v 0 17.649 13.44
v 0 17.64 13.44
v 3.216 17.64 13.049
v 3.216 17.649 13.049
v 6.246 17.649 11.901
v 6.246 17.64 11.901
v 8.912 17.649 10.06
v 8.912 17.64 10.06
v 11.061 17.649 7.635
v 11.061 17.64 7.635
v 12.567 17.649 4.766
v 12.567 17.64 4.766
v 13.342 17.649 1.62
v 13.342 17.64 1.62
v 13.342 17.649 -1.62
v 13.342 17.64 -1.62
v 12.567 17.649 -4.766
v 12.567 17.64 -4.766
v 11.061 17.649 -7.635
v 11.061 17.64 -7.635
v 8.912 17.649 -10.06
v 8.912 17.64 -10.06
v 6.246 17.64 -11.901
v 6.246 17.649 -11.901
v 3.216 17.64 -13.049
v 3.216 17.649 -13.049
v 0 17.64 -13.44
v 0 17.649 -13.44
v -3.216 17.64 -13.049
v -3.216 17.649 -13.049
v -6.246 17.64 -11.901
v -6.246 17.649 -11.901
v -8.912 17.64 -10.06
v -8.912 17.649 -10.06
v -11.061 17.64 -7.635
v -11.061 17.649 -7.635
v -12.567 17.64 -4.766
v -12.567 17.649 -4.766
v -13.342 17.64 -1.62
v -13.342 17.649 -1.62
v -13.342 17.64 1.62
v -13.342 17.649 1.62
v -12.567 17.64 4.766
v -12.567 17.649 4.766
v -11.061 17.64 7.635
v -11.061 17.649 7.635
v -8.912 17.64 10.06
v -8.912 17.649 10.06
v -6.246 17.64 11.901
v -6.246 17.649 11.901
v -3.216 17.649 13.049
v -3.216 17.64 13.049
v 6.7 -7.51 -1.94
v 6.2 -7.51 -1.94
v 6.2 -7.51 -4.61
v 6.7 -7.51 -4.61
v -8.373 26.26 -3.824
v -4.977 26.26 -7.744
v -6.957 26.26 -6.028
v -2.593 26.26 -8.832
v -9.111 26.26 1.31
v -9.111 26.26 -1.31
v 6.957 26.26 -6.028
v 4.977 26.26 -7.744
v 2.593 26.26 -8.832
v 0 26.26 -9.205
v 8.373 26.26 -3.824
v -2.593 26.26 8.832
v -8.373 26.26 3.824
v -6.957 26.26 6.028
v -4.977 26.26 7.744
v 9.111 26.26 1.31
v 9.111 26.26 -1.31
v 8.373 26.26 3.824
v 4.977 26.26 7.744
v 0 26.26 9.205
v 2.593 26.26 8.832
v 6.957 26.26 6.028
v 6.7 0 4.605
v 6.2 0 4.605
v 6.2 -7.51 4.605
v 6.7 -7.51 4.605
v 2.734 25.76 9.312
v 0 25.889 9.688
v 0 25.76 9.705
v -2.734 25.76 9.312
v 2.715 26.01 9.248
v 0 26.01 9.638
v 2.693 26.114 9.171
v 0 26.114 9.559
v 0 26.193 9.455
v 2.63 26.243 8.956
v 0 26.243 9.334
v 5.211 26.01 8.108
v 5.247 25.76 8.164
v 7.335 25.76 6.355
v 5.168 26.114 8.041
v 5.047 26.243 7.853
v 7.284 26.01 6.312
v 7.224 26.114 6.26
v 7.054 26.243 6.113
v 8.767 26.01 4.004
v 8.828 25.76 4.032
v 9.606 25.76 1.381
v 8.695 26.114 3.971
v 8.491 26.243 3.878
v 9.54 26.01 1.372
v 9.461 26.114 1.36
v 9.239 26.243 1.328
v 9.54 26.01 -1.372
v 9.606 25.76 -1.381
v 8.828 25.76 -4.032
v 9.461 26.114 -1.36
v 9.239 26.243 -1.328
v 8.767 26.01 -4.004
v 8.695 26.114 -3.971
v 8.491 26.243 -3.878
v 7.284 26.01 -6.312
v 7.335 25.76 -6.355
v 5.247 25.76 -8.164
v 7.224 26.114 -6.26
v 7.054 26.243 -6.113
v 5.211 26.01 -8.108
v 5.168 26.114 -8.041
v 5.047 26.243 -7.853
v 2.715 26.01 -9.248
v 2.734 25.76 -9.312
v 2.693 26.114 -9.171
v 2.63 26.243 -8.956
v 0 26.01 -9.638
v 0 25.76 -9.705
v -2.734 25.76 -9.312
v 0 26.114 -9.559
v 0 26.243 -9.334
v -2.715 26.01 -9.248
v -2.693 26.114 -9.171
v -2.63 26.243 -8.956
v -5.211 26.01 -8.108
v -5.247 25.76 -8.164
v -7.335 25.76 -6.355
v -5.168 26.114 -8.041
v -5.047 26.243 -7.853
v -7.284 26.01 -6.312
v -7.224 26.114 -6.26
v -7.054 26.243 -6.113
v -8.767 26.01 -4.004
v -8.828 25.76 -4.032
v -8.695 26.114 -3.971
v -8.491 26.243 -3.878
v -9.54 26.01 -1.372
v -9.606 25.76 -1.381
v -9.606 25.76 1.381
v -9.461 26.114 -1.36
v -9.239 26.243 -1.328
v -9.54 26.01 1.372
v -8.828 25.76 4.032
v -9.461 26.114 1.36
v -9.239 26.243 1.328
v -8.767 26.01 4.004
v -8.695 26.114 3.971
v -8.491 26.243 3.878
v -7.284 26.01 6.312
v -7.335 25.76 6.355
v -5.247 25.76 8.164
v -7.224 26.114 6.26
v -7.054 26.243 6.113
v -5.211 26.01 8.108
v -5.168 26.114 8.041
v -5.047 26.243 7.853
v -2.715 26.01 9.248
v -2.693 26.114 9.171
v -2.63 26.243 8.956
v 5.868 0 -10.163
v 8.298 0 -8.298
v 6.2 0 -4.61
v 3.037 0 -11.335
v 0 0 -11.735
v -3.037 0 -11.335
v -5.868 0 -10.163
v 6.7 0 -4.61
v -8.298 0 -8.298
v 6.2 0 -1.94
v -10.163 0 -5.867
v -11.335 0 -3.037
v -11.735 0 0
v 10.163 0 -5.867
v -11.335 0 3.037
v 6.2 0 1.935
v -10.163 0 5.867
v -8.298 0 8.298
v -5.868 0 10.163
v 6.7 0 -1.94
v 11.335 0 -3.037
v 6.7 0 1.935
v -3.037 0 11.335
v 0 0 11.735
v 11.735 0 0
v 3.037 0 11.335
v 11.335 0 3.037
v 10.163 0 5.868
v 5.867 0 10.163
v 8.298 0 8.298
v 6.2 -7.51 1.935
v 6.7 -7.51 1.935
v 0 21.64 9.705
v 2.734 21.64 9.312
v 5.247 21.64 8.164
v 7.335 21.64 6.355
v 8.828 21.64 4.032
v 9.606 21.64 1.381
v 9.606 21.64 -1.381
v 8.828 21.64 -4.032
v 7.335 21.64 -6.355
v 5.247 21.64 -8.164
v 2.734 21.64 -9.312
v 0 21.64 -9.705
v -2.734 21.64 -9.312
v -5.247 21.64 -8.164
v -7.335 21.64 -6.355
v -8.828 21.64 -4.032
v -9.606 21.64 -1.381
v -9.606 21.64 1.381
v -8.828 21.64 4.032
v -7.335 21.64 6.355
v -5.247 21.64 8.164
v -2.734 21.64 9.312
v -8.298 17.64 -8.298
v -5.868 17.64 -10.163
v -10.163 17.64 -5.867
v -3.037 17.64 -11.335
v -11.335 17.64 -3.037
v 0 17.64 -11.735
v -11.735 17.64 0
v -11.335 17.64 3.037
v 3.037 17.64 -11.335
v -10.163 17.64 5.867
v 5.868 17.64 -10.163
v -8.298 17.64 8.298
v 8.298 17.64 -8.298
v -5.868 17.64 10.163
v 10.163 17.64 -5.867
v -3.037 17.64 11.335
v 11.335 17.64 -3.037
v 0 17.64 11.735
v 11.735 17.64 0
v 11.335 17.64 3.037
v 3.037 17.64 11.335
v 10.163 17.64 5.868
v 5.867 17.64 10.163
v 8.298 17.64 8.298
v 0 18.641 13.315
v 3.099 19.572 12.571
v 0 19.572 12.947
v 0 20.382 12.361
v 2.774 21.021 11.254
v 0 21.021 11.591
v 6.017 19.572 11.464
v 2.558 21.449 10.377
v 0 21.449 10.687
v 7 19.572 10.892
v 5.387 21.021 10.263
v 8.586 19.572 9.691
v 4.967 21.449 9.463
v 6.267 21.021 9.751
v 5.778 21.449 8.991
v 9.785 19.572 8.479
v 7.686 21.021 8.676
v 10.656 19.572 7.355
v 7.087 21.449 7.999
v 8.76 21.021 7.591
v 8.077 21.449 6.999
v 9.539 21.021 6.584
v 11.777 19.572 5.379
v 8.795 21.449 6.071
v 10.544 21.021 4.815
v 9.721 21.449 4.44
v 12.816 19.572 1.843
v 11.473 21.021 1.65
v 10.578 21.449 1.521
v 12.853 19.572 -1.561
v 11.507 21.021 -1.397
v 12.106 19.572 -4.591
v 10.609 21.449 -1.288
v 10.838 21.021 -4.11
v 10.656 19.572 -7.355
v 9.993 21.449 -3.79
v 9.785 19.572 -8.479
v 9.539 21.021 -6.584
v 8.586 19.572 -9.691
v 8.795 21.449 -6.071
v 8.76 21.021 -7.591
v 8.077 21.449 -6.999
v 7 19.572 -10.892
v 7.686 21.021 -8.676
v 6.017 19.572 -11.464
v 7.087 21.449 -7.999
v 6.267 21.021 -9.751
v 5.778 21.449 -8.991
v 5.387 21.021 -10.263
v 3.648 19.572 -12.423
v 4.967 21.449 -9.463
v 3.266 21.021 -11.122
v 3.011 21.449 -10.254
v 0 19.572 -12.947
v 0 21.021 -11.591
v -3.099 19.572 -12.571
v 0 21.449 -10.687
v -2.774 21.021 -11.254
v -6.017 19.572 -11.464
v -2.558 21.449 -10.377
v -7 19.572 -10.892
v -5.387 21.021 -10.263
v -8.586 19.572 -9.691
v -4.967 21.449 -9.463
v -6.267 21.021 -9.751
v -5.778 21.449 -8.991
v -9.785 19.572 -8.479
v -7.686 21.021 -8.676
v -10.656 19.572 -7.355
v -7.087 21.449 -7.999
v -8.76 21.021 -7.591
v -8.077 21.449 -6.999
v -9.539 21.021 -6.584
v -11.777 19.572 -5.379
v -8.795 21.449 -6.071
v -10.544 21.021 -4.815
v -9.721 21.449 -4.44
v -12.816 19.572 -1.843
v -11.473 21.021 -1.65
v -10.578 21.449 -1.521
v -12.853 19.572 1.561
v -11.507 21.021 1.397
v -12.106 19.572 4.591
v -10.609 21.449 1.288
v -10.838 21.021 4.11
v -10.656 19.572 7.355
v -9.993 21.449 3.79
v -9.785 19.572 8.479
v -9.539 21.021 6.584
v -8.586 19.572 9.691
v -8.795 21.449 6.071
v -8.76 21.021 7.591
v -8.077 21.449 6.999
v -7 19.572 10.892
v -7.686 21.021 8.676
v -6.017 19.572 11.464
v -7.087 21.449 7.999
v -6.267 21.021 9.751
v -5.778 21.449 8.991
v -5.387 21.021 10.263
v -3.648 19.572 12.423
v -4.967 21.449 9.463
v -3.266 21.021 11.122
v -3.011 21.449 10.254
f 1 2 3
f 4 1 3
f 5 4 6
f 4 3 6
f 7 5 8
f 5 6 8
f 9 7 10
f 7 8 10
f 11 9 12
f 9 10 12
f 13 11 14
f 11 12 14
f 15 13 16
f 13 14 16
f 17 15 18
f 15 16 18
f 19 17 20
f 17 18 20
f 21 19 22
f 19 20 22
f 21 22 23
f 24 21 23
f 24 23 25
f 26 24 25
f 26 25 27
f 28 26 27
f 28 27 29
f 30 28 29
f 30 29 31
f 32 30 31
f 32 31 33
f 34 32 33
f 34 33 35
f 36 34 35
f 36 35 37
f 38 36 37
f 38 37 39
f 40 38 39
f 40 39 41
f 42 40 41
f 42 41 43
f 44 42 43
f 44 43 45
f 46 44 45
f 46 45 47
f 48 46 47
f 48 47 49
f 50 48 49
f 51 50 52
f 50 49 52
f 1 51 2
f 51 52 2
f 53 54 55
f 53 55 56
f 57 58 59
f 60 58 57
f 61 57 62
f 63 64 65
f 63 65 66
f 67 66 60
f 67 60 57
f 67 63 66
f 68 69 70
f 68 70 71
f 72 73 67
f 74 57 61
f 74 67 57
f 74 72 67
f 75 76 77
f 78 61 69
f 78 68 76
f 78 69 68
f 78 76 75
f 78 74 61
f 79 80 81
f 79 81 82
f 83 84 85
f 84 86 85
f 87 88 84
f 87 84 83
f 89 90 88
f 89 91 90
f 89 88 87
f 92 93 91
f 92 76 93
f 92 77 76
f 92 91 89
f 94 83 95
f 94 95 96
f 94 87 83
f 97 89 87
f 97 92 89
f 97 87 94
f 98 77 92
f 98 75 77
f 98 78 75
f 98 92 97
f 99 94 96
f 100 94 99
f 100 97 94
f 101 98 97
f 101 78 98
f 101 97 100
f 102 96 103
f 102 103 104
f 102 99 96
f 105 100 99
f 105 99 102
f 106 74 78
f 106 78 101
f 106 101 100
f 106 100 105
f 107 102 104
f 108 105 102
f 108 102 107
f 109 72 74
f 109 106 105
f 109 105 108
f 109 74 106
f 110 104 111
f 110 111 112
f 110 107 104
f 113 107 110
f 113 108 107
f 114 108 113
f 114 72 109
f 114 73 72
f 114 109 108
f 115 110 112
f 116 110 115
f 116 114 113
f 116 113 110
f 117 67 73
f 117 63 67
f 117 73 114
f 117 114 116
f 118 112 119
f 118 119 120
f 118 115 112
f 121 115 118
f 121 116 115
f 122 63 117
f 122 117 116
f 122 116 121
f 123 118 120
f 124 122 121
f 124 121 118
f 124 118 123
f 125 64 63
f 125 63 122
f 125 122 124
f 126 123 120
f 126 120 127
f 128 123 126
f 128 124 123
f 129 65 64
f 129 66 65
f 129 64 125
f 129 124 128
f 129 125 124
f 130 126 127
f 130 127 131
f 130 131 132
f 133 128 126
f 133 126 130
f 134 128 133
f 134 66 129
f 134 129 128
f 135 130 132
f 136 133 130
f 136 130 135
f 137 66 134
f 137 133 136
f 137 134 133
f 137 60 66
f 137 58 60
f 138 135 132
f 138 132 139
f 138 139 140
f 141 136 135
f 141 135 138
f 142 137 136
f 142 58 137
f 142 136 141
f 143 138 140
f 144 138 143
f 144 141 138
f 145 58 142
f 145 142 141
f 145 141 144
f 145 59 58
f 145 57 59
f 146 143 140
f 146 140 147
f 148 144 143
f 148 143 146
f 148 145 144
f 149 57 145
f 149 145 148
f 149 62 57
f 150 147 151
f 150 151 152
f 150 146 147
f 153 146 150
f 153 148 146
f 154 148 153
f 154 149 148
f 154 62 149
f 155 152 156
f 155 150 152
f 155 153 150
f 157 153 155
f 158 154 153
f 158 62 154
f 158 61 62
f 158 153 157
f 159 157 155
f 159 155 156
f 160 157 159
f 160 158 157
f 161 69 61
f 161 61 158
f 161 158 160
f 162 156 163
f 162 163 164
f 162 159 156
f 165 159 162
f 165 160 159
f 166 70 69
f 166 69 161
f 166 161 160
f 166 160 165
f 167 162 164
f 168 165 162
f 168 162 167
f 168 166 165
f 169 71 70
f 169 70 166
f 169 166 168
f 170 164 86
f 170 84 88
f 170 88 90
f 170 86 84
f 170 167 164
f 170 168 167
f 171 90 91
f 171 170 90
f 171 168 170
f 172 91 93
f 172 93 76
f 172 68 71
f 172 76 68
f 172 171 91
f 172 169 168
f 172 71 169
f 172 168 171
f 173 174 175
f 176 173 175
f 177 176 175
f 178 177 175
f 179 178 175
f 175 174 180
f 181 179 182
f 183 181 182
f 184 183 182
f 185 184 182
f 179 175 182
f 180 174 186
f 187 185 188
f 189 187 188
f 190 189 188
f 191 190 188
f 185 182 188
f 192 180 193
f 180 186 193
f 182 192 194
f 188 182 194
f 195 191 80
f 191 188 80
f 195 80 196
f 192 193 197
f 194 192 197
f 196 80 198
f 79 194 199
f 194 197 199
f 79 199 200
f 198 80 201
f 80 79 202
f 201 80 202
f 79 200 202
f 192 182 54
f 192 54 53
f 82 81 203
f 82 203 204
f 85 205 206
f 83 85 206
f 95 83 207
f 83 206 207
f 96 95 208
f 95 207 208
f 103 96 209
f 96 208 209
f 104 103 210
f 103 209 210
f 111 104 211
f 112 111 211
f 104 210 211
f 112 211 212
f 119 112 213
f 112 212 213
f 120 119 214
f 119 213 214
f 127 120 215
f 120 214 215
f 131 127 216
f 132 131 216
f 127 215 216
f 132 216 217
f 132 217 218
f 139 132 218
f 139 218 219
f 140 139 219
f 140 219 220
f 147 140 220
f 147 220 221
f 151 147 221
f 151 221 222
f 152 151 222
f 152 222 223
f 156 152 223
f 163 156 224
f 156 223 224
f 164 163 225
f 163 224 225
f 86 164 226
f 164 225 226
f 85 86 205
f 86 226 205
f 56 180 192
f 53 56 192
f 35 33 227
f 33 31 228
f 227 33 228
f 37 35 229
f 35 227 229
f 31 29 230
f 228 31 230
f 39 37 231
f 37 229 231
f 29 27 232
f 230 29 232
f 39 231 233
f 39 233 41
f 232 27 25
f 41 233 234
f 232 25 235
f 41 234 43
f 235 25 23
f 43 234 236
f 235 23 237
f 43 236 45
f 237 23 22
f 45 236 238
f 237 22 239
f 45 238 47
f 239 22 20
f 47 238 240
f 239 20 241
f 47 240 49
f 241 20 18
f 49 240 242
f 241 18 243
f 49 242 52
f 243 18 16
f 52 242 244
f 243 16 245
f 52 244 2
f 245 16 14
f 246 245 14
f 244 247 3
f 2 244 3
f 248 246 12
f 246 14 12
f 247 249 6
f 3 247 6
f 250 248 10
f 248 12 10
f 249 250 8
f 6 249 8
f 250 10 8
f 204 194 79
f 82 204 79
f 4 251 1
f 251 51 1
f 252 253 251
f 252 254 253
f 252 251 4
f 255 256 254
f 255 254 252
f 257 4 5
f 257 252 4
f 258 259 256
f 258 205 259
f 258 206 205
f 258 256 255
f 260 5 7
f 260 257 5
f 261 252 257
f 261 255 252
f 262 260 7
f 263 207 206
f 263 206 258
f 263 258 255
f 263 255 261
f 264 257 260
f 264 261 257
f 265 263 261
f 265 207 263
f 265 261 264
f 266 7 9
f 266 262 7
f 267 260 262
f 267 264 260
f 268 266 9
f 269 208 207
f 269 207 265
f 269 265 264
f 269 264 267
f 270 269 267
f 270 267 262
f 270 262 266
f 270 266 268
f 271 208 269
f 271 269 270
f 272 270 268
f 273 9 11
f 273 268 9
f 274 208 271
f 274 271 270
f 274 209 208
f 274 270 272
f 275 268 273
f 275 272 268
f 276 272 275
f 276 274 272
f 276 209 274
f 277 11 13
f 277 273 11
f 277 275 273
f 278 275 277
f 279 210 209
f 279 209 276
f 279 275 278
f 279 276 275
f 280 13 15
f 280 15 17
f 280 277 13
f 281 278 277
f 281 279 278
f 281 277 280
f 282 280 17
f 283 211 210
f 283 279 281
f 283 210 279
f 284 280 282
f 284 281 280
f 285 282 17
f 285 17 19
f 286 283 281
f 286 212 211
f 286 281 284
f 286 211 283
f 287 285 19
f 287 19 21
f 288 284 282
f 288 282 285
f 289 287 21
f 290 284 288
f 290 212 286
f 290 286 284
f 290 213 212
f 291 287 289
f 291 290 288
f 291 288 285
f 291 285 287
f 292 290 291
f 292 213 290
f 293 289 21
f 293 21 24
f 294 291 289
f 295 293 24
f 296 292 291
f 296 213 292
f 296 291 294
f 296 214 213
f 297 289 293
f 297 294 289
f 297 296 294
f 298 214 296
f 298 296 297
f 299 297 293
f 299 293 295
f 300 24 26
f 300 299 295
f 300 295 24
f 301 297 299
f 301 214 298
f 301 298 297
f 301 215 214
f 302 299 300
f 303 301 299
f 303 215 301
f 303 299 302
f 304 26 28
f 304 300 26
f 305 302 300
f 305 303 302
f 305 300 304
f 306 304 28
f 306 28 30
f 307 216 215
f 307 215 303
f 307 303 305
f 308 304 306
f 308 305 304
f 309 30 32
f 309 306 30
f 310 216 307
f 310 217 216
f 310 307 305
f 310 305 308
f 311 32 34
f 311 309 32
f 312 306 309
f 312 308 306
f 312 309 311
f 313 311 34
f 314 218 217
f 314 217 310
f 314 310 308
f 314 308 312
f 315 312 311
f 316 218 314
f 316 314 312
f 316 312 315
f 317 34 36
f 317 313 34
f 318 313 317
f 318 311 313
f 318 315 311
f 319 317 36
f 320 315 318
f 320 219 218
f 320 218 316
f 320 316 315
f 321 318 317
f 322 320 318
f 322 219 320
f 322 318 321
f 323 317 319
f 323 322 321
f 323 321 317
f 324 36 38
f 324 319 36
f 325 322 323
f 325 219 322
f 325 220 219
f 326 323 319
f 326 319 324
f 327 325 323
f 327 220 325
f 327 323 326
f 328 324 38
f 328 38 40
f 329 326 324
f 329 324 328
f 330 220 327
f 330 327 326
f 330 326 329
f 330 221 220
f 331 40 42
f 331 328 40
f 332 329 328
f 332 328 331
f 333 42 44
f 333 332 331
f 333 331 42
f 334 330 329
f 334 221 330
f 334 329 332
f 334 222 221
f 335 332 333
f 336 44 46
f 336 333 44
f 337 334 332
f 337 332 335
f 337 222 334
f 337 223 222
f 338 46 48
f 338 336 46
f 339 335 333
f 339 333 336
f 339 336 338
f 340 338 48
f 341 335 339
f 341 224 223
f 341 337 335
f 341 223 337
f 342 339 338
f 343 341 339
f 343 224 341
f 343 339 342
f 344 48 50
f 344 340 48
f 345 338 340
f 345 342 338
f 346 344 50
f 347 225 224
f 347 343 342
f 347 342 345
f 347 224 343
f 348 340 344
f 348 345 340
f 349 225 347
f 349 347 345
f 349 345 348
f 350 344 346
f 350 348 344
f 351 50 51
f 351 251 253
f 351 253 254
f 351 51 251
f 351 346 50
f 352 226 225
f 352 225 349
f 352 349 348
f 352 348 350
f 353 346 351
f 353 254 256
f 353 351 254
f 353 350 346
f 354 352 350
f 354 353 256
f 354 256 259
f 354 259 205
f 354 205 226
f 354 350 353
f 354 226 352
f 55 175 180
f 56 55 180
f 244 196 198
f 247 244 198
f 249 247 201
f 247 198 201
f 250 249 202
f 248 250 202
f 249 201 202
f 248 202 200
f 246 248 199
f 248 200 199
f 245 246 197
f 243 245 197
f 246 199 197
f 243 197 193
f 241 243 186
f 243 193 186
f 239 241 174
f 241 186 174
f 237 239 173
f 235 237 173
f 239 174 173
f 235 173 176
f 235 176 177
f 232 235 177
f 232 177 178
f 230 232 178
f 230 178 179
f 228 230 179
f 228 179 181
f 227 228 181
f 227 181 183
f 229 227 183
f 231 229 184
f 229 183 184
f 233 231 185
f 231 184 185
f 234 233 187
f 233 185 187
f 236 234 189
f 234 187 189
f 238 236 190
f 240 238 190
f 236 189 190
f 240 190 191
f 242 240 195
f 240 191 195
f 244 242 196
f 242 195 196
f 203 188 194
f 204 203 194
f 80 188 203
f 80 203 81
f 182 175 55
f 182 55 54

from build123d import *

# Parameters (mm, degrees)
SKETCH1_R           = 11.735
BOSS_EXTRUDE1_DEPTH = 17.64
SKETCH2_R           = 13.44
BOSS_EXTRUDE2_DEPTH = 4
SKETCH3_R           = 9.705
BOSS_EXTRUDE3_DEPTH = 4.62
FILLET1_R           = 4
FILLET2_R           = 0.5
SKETCH4_W           = 0.5
SKETCH4_H           = 2.67
BOSS_EXTRUDE4_DEPTH = 7.51


with BuildPart() as part:
    # Sketch1 → Boss-Extrude1 (new body)
    with BuildSketch(Plane(origin=(0, 0, 0), x_dir=(1, 0, 0), z_dir=(0, 1, 0))):
        with Locations(Location((0, 0, 0), (0, 0, 270))):
            Circle(SKETCH1_R)
    extrude(amount=BOSS_EXTRUDE1_DEPTH)

    # Sketch2 → Boss-Extrude2 (add)
    with BuildSketch(Plane(origin=(0, 17.64, 0), x_dir=(1, 0, 0), z_dir=(0, 1, 0))):
        with Locations(Location((0, 0, 0), (0, 0, 270))):
            Circle(SKETCH2_R)
    extrude(amount=BOSS_EXTRUDE2_DEPTH)

    # Sketch3 → Boss-Extrude3 (add)
    with BuildSketch(Plane(origin=(0, 21.64, 0), x_dir=(1, 0, 0), z_dir=(0, 1, 0))):
        with Locations(Location((0, 0, 0), (0, 0, 270))):
            Circle(SKETCH3_R)
    extrude(amount=BOSS_EXTRUDE3_DEPTH)

    # Fillet1
    # the kernel refuses this fillet: 4 mm, written as the material it takes off along each edge
    with BuildSketch(Plane(origin=(0, 21.64, 0), x_dir=(0, 0, 1), z_dir=(-1, 0, 0))) as fillet1_piece_1:
        with BuildLine():
            CenterArc((9.44, -3.991212222), FILLET1_R, 0, 86.201372408)
            Line((9.705, 0), (9.7103, 0.079824244))
            ThreePointArc((9.7103, 0.079824244), (11.5725, 0.08), (13.44, 0.08))
            Line((13.44, 0.08), (13.52, 0))
            Line((13.52, 0), (13.52, -3.991212222))
            Line((13.52, -3.991212222), (13.44, -3.991212222))
        make_face()
    revolve(axis=Axis((0, 21.64, 0), (0, 1, 0)), mode=Mode.SUBTRACT)

    # Fillet2
    fillet2_edges = [part.edges().sort_by_distance(p)[0] for p in [
        (0, 26.26, -9.705),
    ]]
    fillet(fillet2_edges, radius=FILLET2_R)

    # Sketch4 → Boss-Extrude4 (add)
    with BuildSketch(Plane.XZ):
        with Locations((6.45, 3.27)):
            Rectangle(SKETCH4_W, SKETCH4_H)
        with Locations((6.45, -3.275)):
            Rectangle(SKETCH4_W, SKETCH4_H)
    extrude(amount=BOSS_EXTRUDE4_DEPTH)


solid = part.part
